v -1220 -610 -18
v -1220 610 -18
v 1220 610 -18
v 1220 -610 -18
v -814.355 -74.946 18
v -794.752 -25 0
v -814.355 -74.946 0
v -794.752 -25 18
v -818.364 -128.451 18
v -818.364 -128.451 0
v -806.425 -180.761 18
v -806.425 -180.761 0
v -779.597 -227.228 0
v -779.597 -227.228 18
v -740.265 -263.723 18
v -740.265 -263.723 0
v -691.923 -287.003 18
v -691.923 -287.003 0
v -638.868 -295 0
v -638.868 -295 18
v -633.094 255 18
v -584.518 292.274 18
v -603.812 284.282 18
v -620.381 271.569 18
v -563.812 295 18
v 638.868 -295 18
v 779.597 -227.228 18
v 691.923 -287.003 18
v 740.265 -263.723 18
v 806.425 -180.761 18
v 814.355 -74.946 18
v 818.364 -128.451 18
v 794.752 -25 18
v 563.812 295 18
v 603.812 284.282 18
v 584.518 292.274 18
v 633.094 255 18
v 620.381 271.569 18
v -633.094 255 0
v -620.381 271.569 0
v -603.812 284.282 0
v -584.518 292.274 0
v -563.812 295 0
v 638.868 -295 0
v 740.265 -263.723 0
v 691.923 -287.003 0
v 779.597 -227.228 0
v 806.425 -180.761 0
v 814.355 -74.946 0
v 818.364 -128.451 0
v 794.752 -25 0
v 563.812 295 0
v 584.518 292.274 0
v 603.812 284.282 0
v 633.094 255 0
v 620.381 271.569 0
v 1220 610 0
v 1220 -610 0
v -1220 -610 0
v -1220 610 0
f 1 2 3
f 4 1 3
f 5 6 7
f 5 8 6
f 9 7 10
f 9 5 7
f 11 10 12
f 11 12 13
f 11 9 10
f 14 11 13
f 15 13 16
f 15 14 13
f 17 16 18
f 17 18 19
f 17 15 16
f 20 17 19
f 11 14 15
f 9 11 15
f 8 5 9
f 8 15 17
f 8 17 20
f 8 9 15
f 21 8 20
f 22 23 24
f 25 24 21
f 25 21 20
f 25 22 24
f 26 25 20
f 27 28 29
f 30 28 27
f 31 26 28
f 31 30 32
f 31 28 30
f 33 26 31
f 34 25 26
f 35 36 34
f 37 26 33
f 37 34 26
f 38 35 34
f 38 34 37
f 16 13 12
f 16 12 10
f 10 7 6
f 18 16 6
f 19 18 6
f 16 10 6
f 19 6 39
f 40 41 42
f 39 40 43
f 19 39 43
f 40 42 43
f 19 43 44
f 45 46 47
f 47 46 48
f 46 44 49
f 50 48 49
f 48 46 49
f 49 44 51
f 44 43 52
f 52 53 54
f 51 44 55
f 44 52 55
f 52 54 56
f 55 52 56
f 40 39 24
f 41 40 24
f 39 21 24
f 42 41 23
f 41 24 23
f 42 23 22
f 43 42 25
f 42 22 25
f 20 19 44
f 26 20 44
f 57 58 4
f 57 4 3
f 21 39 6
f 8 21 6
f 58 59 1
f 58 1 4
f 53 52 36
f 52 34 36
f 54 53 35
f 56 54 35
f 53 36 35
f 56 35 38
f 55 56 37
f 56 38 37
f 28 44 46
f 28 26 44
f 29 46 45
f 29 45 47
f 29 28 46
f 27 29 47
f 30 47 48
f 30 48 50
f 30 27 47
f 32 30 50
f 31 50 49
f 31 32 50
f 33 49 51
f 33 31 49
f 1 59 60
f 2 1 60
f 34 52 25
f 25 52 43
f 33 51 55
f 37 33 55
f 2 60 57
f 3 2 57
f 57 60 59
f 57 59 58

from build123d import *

# Parameters (mm, degrees)
F1_DEPTH = 18
F2_W     = 2440
F2_H     = 1220
F3_DEPTH = 18
F4_R     = 180
F5_R     = 80


with BuildPart() as f1:
    # F0 (on Top) → F1 (new body)
    with BuildSketch(Plane.XY):
        Polygon((610, 295), (-610, 295), (-950.636659, -295), (950.636659, -295), align=None)
    extrude(amount=F1_DEPTH)

    # F4
    f4_edges = [f1.edges().sort_by_distance(p)[0] for p in [
        (-950.636659, -295, 9),
        (950.636659, -295, 9),
    ]]
    fillet(f4_edges, radius=F4_R)

    # F5
    f5_edges = [f1.edges().sort_by_distance(p)[0] for p in [
        (-610, 295, 9),
        (610, 295, 9),
    ]]
    fillet(f5_edges, radius=F5_R)


with BuildPart() as f3:
    # F2 (on Top) → F3 (new body)
    with BuildSketch(Plane.XY):
        Rectangle(F2_W, F2_H)
    extrude(amount=-F3_DEPTH)


solid = Compound([f1.part, f3.part])
